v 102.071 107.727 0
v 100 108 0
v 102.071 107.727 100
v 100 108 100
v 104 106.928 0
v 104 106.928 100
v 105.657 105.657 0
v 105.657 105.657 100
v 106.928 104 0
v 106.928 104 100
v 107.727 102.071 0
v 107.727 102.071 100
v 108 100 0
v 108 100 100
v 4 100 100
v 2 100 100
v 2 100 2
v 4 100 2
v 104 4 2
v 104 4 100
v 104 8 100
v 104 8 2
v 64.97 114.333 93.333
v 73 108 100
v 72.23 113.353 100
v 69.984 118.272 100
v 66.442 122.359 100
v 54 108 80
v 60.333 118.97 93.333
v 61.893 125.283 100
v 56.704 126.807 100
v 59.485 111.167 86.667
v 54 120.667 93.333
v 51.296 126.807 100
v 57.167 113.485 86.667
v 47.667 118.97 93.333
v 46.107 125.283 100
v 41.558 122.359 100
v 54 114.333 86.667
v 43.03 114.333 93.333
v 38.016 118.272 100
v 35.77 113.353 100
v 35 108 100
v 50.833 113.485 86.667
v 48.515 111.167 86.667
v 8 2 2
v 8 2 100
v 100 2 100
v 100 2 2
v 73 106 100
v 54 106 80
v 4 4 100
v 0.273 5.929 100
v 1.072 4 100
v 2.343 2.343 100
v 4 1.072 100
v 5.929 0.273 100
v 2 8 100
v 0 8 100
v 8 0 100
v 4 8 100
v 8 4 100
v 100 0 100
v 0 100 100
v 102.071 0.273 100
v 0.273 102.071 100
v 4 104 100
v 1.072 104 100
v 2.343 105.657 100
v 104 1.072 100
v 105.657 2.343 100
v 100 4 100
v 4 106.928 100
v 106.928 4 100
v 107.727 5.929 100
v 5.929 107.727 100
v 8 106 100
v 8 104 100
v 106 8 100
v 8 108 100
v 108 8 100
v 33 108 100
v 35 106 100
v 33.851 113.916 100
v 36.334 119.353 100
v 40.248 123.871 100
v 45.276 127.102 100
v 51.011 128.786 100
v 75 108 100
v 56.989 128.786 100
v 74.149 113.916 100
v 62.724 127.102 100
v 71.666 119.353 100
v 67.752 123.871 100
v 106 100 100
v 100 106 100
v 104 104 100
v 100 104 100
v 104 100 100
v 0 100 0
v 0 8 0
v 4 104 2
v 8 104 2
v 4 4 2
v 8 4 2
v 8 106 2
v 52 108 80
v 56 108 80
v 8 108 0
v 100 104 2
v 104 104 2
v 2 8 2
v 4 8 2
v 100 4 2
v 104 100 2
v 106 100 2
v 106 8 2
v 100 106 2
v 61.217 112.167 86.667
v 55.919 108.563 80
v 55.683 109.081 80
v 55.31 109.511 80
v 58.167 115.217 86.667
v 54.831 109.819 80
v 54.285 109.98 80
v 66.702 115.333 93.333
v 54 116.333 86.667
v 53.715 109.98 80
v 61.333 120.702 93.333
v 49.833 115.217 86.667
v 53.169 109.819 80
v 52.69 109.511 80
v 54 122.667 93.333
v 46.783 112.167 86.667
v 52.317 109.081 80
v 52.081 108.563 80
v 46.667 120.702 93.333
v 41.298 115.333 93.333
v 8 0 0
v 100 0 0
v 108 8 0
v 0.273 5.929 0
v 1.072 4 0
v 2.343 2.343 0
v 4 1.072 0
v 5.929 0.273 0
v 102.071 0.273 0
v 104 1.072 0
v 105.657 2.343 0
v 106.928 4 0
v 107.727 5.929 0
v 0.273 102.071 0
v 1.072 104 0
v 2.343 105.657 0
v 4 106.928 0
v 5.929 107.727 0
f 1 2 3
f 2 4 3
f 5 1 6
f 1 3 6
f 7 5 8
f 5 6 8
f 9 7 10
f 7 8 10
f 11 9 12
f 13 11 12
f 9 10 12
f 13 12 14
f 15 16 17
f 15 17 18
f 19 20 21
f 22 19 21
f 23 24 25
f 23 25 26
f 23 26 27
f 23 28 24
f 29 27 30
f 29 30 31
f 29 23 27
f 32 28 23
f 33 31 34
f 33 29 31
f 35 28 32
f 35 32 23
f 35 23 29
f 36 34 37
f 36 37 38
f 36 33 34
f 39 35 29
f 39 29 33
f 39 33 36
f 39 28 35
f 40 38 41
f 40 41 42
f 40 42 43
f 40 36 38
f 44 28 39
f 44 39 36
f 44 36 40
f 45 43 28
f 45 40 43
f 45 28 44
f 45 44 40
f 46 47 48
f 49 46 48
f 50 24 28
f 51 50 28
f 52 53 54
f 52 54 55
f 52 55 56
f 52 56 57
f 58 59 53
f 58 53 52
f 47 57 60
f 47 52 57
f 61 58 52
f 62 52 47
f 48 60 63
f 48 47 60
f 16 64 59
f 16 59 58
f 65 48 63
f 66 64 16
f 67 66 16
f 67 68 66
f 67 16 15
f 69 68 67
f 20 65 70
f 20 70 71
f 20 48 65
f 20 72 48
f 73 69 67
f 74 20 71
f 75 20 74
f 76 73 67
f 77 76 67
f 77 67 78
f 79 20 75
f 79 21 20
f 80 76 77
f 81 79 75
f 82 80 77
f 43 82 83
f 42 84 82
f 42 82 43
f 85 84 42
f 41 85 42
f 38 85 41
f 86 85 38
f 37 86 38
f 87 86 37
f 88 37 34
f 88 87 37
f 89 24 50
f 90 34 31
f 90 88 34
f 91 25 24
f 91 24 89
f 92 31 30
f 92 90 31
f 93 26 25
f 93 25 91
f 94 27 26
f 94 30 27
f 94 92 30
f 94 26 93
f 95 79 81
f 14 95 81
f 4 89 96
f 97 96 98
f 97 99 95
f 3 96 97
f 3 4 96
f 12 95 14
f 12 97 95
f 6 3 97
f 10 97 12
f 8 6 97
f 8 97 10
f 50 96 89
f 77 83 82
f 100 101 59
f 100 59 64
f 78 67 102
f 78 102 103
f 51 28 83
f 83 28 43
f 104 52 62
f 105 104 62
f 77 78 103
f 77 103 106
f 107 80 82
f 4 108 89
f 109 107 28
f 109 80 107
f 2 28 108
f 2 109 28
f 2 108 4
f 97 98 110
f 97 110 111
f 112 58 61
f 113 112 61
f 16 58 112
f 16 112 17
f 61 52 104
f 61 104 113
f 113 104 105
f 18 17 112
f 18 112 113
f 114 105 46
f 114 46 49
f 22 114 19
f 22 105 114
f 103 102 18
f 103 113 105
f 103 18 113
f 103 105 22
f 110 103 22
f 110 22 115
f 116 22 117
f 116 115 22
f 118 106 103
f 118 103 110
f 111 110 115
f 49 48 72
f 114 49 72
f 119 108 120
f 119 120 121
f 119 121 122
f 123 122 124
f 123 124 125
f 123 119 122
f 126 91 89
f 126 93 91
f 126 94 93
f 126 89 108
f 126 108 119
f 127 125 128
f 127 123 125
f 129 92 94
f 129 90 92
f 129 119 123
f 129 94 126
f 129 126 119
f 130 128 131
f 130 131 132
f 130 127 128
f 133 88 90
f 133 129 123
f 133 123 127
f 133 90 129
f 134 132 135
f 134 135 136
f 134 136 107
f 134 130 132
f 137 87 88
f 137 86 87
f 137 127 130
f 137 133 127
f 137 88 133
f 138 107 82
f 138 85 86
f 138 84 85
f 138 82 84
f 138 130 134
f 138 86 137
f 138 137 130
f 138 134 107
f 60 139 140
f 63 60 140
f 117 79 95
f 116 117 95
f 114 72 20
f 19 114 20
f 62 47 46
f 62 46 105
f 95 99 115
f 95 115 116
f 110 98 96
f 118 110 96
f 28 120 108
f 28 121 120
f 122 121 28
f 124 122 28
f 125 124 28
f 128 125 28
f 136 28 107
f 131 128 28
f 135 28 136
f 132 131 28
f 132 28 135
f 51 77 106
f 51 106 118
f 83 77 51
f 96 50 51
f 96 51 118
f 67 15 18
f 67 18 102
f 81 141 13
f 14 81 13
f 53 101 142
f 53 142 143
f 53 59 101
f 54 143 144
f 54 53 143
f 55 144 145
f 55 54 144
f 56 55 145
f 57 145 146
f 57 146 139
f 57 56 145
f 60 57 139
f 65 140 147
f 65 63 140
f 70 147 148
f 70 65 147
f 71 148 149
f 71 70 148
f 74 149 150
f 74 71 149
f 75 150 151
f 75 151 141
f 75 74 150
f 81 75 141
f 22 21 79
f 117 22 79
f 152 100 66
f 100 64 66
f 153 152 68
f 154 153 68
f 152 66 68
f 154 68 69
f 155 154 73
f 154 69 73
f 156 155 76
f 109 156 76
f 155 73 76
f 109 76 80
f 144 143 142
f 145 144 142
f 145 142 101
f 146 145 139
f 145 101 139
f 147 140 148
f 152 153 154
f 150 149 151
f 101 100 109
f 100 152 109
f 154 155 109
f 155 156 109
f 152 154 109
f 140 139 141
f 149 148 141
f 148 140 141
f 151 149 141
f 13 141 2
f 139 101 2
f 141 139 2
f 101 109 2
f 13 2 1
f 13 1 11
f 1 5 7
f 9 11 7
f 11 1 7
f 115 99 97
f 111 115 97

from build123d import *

# Parameters (mm, degrees)
SKETCH095_W         = 108
SKETCH095_H         = 108
PAD041_DEPTH        = 100
SKETCH096_W         = 100
SKETCH096_H         = 100
POCKET036_DEPTH     = 98
FILLET002_R         = 8
SKETCH097_W         = 2
SKETCH097_H         = 92
SKETCH097_W_2       = 92
SKETCH097_H_2       = 2
POCKET037_DEPTH     = 98
REVOLUTION012_ANGLE = 180
POCKET038_DEPTH     = 2


with BuildPart() as part:
    # Sketch095 → Pad041 (new body)
    with BuildSketch(Plane.XY):
        with Locations((54, 54)):
            Rectangle(SKETCH095_W, SKETCH095_H)
    extrude(amount=PAD041_DEPTH)

    # Sketch096 (on Face6 of Pad041) → Pocket036 (cut)
    with BuildSketch(Plane.XY.offset(100)):
        with Locations((54, 54)):
            Rectangle(SKETCH096_W, SKETCH096_H)
    extrude(amount=-POCKET036_DEPTH, mode=Mode.SUBTRACT)

    # Fillet002
    fillet002_edges = [part.edges().sort_by_distance(p)[0] for p in [
        (108, 0, 50),
        (0, 0, 50),
        (0, 108, 50),
        (108, 108, 50),
    ]]
    fillet(fillet002_edges, radius=FILLET002_R)

    # Sketch097 (on Face5 of Fillet002) → Pocket037 (cut)
    with BuildSketch(Plane.XY.offset(100)):
        with Locations((3, 54)):
            Rectangle(SKETCH097_W, SKETCH097_H)
        with Locations((54, 3)):
            Rectangle(SKETCH097_W_2, SKETCH097_H_2)
        with Locations((105, 54)):
            Rectangle(SKETCH097_W, SKETCH097_H)
        with Locations((54, 105)):
            Rectangle(SKETCH097_W_2, SKETCH097_H_2)
    extrude(amount=-POCKET037_DEPTH, mode=Mode.SUBTRACT)

    # Sketch105 (on Face10 of Pocket037) → Revolution012 (revolve)
    with BuildSketch(Plane(origin=(0, 108, 0), x_dir=(-1, 0, 0), z_dir=(0, 1, 0))):
        Polygon((-75, 100), (-73, 100), (-54, 80), (-56, 80), align=None)
    revolve(axis=Axis((54, 108, 80), (0, 0, 1)), revolution_arc=REVOLUTION012_ANGLE)

    # Sketch106 (on Face12 of Revolution012) → Pocket038 (cut)
    with BuildSketch(Plane(origin=(0, 108, 0), x_dir=(-1, 0, 0), z_dir=(0, 1, 0))):
        Polygon((-73, 100), (-54, 80), (-35, 100), align=None)
    extrude(amount=-POCKET038_DEPTH, mode=Mode.SUBTRACT)


solid = part.part
